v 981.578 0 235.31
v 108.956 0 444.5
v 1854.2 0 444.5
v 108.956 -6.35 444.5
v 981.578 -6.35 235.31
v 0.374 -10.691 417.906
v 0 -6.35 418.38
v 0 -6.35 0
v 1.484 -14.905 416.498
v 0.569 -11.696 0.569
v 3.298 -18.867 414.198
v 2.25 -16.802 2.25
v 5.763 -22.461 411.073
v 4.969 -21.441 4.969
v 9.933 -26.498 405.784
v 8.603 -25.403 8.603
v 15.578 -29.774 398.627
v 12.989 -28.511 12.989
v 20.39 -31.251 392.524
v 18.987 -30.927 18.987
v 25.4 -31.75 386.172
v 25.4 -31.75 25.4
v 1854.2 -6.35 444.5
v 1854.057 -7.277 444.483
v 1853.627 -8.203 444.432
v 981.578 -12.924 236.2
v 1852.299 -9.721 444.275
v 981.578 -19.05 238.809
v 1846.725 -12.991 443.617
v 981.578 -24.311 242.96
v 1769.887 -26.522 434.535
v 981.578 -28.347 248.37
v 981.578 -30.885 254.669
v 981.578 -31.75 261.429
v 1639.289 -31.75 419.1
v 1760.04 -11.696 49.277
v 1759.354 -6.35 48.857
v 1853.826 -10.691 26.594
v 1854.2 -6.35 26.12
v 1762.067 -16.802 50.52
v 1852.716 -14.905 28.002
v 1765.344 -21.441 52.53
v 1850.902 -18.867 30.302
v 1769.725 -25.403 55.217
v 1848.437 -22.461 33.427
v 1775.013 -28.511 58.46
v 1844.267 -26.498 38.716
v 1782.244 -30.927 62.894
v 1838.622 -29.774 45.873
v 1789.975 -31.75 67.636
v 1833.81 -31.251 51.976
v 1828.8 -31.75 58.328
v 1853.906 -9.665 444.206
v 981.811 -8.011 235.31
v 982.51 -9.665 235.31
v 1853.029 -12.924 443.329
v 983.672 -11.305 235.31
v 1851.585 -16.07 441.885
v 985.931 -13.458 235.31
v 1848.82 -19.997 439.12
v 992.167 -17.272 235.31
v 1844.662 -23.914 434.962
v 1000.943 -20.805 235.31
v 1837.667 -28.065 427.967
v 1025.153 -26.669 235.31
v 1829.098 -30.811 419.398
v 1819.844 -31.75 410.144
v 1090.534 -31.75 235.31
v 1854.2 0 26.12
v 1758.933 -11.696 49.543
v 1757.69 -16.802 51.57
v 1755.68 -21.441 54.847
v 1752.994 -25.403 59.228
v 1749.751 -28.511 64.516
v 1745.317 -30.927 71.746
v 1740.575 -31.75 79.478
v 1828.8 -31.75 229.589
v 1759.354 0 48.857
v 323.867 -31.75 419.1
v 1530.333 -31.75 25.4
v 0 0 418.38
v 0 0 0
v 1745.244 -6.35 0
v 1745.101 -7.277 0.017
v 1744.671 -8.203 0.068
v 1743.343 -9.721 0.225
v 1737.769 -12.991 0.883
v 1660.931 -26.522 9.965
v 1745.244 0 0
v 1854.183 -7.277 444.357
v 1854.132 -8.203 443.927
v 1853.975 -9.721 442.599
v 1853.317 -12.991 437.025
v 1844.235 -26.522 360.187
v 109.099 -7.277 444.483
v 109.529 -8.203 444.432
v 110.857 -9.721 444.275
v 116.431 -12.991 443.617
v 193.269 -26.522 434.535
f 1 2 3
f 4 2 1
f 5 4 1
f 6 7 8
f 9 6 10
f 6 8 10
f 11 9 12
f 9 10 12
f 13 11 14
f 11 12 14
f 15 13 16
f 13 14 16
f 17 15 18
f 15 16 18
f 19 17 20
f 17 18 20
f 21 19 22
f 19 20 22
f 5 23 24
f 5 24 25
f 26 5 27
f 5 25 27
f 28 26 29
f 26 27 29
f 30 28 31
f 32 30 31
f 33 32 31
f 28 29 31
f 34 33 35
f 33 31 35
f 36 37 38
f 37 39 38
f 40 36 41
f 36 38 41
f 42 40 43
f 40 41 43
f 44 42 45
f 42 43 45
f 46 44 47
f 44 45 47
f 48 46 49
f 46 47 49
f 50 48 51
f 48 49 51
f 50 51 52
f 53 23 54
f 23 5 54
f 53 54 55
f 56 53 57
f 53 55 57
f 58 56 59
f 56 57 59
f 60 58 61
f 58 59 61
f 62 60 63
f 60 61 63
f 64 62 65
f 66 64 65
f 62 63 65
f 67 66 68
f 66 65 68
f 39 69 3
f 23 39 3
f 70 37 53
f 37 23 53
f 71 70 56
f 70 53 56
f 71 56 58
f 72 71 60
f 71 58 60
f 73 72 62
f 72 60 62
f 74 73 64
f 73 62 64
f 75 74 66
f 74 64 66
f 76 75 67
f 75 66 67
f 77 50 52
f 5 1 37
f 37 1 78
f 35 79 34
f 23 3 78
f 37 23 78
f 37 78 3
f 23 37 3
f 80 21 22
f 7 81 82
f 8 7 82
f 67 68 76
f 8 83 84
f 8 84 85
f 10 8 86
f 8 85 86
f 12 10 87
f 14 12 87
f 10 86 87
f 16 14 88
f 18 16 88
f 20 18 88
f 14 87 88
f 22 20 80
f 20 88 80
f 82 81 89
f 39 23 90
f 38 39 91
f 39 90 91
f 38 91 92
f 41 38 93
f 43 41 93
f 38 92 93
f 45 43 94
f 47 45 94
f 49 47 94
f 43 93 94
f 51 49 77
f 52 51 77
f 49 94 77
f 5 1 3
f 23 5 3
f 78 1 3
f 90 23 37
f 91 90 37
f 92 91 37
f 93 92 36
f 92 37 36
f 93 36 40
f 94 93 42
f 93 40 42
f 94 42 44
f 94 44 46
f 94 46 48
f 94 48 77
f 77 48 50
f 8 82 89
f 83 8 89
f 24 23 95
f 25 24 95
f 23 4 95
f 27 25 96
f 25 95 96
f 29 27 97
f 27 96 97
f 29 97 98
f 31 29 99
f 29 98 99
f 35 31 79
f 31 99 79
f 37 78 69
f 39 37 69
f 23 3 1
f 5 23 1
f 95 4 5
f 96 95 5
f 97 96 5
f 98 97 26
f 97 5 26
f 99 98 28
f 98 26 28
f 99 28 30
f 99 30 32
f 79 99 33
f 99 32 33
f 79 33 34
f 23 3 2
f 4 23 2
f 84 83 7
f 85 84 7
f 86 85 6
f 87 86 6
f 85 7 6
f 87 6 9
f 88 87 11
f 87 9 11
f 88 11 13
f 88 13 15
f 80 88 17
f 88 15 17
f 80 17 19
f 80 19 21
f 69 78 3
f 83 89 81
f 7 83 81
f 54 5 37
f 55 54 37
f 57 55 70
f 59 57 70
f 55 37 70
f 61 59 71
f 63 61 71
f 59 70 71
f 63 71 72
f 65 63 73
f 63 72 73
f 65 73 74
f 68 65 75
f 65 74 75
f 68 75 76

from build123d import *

# Parameters (mm, degrees)
F1_DEPTH = 31.75
F2_R     = 25.4
F3_R     = 25.4
F3_2_R   = 25.4
F4_DEPTH = 31.75
F5_R     = 25.4


with BuildPart() as f1:
    # F0 (on Front) → F1 (new body)
    with BuildSketch(Plane.XZ):
        Polygon((0, 418.3803441549), (0, 0), (1745.2437213318, 0), align=None)
    extrude(amount=F1_DEPTH)

    # F2
    f2_edges = [f1.edges().sort_by_distance(p)[0] for p in [
        (0, -31.75, 209.190172),
        (872.621861, -31.75, 0),
        (872.621861, -31.75, 209.190172),
    ]]
    fillet(f2_edges, radius=F2_R)


with BuildPart() as f1b:
    # F0 (on Front) → F1, piece 2 (new body)
    with BuildSketch(Plane.XZ):
        Polygon((1854.2, 444.5), (108.9562786682, 444.5), (981.5781393341, 235.3098279226), align=None)
    extrude(amount=F1_DEPTH)

    # F3
    f3_edges = [f1b.edges().sort_by_distance(p)[0] for p in [
        (1417.88907, -31.75, 339.904914),
        (981.578139, -31.75, 444.5),
        (545.267209, -31.75, 339.904914),
    ]]
    fillet(f3_edges, radius=F3_R)


with BuildPart() as f1c:
    # F0 (on Front) → F1, piece 3 (new body)
    with BuildSketch(Plane.XZ):
        Polygon((1759.3540056505, 48.8567092851), (1854.2, 26.1196558451), (1854.2, 444.5), align=None)
    extrude(amount=F1_DEPTH)

    # F3#2
    f3_2_edges = [f1c.edges().sort_by_distance(p)[0] for p in [
        (1806.777003, -31.75, 37.488183),
        (1854.2, -31.75, 235.309828),
        (1806.777003, -31.75, 246.678355),
    ]]
    fillet(f3_2_edges, radius=F3_2_R)


with BuildPart() as f4:
    # F0 (on Front) → F4 (new body)
    with BuildSketch(Plane.XZ):
        Polygon((1759.3540056505, 48.8567092851), (1854.2, 444.5), (981.5781393341, 235.3098279226), align=None)
    extrude(amount=F4_DEPTH)

    # F5
    f5_edges = [f4.edges().sort_by_distance(p)[0] for p in [
        (1806.777003, -31.75, 246.678355),
        (1417.88907, -31.75, 339.904914),
        (1370.466072, -31.75, 142.083269),
    ]]
    fillet(f5_edges, radius=F5_R)


solid = Compound([f1.part, f1b.part, f1c.part, f4.part])
